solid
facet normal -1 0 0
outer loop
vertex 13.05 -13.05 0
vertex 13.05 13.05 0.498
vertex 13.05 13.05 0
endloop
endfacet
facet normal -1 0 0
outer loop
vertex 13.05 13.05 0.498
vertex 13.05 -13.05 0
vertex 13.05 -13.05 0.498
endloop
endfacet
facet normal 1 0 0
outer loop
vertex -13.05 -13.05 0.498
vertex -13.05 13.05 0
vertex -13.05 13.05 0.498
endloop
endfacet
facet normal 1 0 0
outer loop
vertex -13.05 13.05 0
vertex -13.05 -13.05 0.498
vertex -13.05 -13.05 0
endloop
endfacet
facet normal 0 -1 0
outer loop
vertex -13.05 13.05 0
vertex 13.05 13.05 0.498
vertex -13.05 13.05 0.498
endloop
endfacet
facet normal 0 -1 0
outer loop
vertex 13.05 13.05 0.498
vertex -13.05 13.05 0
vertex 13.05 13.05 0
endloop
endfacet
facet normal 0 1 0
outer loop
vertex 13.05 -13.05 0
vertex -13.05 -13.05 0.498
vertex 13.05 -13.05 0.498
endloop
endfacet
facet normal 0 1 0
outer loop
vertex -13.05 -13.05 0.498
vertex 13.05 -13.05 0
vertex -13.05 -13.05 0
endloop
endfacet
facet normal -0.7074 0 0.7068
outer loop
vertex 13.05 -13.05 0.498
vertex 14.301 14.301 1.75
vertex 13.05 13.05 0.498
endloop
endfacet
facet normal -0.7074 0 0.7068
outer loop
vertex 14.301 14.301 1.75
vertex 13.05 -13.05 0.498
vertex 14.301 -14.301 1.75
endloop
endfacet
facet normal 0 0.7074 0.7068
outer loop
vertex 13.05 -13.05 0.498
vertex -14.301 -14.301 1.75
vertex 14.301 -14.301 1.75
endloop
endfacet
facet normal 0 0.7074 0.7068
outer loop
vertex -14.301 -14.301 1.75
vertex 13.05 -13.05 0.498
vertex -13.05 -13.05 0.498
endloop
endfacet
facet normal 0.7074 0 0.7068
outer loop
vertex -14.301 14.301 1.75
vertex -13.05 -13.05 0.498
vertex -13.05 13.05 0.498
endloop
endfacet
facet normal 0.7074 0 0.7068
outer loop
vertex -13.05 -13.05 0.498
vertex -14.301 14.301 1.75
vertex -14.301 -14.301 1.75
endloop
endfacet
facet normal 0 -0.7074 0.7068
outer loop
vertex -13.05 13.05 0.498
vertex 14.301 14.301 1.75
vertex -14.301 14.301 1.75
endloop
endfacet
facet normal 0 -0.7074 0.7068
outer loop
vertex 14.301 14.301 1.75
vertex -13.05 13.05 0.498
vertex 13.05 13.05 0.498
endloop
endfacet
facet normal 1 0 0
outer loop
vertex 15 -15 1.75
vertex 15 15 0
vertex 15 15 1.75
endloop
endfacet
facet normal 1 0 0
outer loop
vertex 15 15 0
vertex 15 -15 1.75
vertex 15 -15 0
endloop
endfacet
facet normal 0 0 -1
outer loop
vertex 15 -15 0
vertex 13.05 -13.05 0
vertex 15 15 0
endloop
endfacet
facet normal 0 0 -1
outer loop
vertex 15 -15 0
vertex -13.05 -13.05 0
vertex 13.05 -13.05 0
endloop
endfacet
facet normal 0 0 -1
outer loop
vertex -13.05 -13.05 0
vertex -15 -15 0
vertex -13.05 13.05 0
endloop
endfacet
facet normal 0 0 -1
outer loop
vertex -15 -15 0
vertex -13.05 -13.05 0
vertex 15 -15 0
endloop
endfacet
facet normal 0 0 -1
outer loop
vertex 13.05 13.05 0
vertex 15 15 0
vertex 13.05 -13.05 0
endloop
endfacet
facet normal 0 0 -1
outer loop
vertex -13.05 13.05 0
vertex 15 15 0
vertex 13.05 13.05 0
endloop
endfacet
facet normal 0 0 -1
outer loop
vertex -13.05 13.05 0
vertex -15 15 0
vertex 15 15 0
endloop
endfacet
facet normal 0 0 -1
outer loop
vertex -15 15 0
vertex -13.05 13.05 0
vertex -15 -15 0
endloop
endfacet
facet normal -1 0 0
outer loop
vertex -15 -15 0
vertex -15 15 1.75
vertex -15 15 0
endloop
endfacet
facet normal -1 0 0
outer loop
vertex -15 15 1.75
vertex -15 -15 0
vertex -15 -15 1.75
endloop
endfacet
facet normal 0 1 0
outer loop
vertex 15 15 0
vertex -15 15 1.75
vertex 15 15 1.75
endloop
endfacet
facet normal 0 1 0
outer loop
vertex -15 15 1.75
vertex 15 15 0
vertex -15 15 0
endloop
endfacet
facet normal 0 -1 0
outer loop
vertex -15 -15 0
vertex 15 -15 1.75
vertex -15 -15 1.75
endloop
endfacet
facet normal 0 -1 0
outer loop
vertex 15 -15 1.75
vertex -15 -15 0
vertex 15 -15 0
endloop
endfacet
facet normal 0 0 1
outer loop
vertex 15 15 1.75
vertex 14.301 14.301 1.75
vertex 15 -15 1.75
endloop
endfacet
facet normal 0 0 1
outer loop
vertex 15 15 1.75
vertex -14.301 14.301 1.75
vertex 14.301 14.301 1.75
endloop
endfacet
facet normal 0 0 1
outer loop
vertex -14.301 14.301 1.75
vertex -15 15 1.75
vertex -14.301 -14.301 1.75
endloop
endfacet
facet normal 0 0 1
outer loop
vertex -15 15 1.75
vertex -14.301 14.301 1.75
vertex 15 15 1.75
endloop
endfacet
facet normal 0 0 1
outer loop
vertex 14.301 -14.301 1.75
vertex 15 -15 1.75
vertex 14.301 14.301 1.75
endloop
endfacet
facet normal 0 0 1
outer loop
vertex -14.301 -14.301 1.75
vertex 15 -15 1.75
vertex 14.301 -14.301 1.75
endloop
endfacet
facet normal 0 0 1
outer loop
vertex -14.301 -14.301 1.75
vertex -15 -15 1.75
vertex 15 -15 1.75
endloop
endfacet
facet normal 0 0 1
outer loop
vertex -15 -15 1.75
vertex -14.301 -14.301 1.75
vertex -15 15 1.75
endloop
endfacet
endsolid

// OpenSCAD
// file: ../assorter.scad
// Variables

e=0.001;

x = 2;
y = 3;

//box();
//grid();
//slice();
//stack();

function middle(times) = -length_default/2 +(length_default+(times-1)*pitch_default)/2 ;
left   = -length_default/2 ;
front  = -length_default/2 ;
right  =  length_default/2+(x-1)*pitch_default ;
back   =  length_default/2+(y-1)*pitch_default ;
bottom =  0;
top    =  height_default;


grid_height = lift_default + triangle_height_default - cut_default ;

module body_form(
A,B,K,L,height
){
    polyhedron(
        points = [
            [-A,-B, 0],  // 0
            [ A,-B, 0],   // 1
            [ A, B, 0],  // 2
            [-A, B, 0], // 3
            [-K,-L, height],  // 0
            [ K,-L, height],   // 1
            [ K, L, height],  // 2
            [-K, L, height]], // 3
        faces = [
            [0,1,2,3],  // bottom
            [4,5,1,0],  // front
            [7,6,5,4],  // top
            [5,6,2,1],  // right
            [6,7,3,2],  // back
            [7,4,0,3]] // left
        );
}

module box_bottom(
  lift = lift_default,
  length = length_default,
  height = height_default ,
  triangle_height = triangle_height_default,
  bottom = true, // if the bottom should be added or not... (the inner one should not have it)
){

    // größere
    K = length/2 ;
    L = K;
    // kleinere
    A = (length-2*triangle_height)/2;
    B = A;
    remaining_height = height - lift - triangle_height;
    if (bottom) {
    translate([0,0,(lift+1)/2])
        cube([2*A,2*B,lift+1],center=true);
    }
    translate([0,0,lift-e])
    // creates an inverted cut pyramid
    body_form(A,B,K,L,triangle_height+e);

}

module solid_box(
  x = x,
  y = y,
  lift = lift_default,
  length = length_default,
  height = height_default ,
  triangle_height = triangle_height_default,
  pitch = pitch_default,
  bottom = true,
  cut_sides = true,
  fill_pyramid_tip = false,
){
    difference(){
    union(){
        remaining_height = height - lift - triangle_height;
        for (m = [0:y-1]){
            for (n = [0:x-1])
                translate([n*pitch,m*pitch,0])
                    box_bottom(length=length,bottom=bottom);
        }
        translate([-length/2,-length/2,lift + triangle_height-e])
            cube([(x-1)*pitch+length,(y-1)*pitch +length,remaining_height]);

        if (fill_pyramid_tip){
            // fill the gaps inside the pyramids *shrug*
            translate([-length/2,-length/2,triangle_height+0.1])
                cube([(x-1)*pitch+length,(y-1)*pitch +length,1]);
        }
    }
    if (cut_sides) {
        // cut left side of box
        translate([-length/2,-length/2-2,0])
            cut_object(length = (y-1)*pitch +length +4 );

        // cut right side of box
        translate([(x-1)*pitch+length/2,-length/2-2,0])
        mirror(v=[1,0,0])
            cut_object(length = (y-1)*pitch +length +4 );

        // cut front side of box
        //translate([(x-1)*pitch+length/2,-length/2-2,0])
        translate([-length/2-2,-length/2,0])
        rotate([0,0,-90])
        mirror(v=[1,0,0])
            cut_object(length = (x-1)*pitch +length +4 );

        // cut back side of box
        translate([-length/2-2,length/2+(y-1)*pitch,0])
        rotate([0,0,-90])
            cut_object(length = (x-1)*pitch +length +4 );
        }
    }

}

module box(handle_enable = true){
    difference(){
        solid_box(fill_pyramid_tip=true);
        // inner solid box without the cubed lift on the bottom.. now the wall thickness looks quite okay
        // we have to lower the innter box about lift_default distance again
        translate([0,0,wall_thickness_default- lift_default])
            solid_box(length = length_default - 2* wall_thickness_default,bottom=false);
    }
    if (handle_enable) {
        // add handle
        translate([
            middle(x),
            -length_default/2+wall_thickness_default,
            height_default-handle_top_distance
        ])
            handle();
    }
}

module grid(
  x = x,
  y = y,
  lift = lift_default,
  length = length_default,
  height = height_default ,
  triangle_height = triangle_height_default,
  pitch = pitch_default
){
    difference(){
    // main body
        union(){
            difference(){
                translate([-length/2,-length/2,0])
                cube([(x-1)*pitch+length,(y-1)*pitch +length,lift+triangle_height]);

                translate([0,0,-e])
                    solid_box(length= length_default + 0.1, cut_sides = false );     // do we need some added clearence here?
            }
        }

    translate([-length/2-1,-length/2-1,lift + triangle_height - cut_default])
        cube([(x-1)*pitch+length+2,(y-1)*pitch +length + 2,2]);
    }
}


module cut_object(
    length = length_default,
    height = height_default,
    diff_bottom = diff_bottom_default,

){
    rotate([-90,0,0])
    linear_extrude(height=length)

        polygon(
            [   [-e,0],
                [-e,-height],
                [0,-height],
                [diff_bottom,0]
            ]
            );
}

module slice() {
    difference(){
        box();
        translate([-length_default/2-10,-length_default/2-10,-5])
        cube([
            1/2*(length_default+(x-1)*pitch_default + 20),
            length_default+(y-1)*pitch_default +20,
            height_default+10]);
    }
}

module handle(){
    r = 2;
    $fa = 1;
    $fs = 0.4;

    rotate([0,180,0])
    hull(){
        hull(){
            //left corner
            translate([-handle_width/2,0,0])
                cube([1,1,handle_top_height ]);

            // right corner
            translate([handle_width/2,0,0])
            translate([-1,0,0])
                cube([1,1,handle_top_height ]);

            // left round corner
            translate([-handle_width/2,handle_depth])
            translate([r,-r,0])
            cylinder(r=r,h=handle_top_height);

            // right round corner
            translate([handle_width/2,handle_depth])
            translate([-r,-r,0])
            cylinder(r=r,h=handle_top_height );
        }

        // hull anchor
        height = handle_depth / tan(handle_angle);

        translate([-handle_width/2,0,0])
            cube([handle_width,0.1,height]);
    }
}

module stack(){
    // module to preview a stacked box
    slice();
    translate([0,0,height_default-handle_top_distance ])
    slice();
}
// file: defaults.scad
/*
set of variables for the mini drawer-cabinet version
each box is 62.5 by 120 mm in Size
With this Settings 2 by 4 boxes could fit in each drawer
*/

length_default = 30 ;
pitch_default  = 30 ;

height_default = 33; // in theory 35, but then they have to sit perfectly to not block the schublade

triangle_height_default = 2 ;
triangle_width_default  = 2 * triangle_height_default;
cut_default=0.75;
lift_default=0.5;

wall_thickness_default = 1;

handle_width = 15;
handle_depth = 7;

handle_top_height = 1;
handle_angle = 45; // degree
handle_top_distance = 1.75; // am gedruckten objekt zu prüfen

diff_bottom_default = 0.5;
// main file
// grids ;-D

include <defaults.scad>
include <../assorter.scad>

x = 1;
y = 1;

grid();
